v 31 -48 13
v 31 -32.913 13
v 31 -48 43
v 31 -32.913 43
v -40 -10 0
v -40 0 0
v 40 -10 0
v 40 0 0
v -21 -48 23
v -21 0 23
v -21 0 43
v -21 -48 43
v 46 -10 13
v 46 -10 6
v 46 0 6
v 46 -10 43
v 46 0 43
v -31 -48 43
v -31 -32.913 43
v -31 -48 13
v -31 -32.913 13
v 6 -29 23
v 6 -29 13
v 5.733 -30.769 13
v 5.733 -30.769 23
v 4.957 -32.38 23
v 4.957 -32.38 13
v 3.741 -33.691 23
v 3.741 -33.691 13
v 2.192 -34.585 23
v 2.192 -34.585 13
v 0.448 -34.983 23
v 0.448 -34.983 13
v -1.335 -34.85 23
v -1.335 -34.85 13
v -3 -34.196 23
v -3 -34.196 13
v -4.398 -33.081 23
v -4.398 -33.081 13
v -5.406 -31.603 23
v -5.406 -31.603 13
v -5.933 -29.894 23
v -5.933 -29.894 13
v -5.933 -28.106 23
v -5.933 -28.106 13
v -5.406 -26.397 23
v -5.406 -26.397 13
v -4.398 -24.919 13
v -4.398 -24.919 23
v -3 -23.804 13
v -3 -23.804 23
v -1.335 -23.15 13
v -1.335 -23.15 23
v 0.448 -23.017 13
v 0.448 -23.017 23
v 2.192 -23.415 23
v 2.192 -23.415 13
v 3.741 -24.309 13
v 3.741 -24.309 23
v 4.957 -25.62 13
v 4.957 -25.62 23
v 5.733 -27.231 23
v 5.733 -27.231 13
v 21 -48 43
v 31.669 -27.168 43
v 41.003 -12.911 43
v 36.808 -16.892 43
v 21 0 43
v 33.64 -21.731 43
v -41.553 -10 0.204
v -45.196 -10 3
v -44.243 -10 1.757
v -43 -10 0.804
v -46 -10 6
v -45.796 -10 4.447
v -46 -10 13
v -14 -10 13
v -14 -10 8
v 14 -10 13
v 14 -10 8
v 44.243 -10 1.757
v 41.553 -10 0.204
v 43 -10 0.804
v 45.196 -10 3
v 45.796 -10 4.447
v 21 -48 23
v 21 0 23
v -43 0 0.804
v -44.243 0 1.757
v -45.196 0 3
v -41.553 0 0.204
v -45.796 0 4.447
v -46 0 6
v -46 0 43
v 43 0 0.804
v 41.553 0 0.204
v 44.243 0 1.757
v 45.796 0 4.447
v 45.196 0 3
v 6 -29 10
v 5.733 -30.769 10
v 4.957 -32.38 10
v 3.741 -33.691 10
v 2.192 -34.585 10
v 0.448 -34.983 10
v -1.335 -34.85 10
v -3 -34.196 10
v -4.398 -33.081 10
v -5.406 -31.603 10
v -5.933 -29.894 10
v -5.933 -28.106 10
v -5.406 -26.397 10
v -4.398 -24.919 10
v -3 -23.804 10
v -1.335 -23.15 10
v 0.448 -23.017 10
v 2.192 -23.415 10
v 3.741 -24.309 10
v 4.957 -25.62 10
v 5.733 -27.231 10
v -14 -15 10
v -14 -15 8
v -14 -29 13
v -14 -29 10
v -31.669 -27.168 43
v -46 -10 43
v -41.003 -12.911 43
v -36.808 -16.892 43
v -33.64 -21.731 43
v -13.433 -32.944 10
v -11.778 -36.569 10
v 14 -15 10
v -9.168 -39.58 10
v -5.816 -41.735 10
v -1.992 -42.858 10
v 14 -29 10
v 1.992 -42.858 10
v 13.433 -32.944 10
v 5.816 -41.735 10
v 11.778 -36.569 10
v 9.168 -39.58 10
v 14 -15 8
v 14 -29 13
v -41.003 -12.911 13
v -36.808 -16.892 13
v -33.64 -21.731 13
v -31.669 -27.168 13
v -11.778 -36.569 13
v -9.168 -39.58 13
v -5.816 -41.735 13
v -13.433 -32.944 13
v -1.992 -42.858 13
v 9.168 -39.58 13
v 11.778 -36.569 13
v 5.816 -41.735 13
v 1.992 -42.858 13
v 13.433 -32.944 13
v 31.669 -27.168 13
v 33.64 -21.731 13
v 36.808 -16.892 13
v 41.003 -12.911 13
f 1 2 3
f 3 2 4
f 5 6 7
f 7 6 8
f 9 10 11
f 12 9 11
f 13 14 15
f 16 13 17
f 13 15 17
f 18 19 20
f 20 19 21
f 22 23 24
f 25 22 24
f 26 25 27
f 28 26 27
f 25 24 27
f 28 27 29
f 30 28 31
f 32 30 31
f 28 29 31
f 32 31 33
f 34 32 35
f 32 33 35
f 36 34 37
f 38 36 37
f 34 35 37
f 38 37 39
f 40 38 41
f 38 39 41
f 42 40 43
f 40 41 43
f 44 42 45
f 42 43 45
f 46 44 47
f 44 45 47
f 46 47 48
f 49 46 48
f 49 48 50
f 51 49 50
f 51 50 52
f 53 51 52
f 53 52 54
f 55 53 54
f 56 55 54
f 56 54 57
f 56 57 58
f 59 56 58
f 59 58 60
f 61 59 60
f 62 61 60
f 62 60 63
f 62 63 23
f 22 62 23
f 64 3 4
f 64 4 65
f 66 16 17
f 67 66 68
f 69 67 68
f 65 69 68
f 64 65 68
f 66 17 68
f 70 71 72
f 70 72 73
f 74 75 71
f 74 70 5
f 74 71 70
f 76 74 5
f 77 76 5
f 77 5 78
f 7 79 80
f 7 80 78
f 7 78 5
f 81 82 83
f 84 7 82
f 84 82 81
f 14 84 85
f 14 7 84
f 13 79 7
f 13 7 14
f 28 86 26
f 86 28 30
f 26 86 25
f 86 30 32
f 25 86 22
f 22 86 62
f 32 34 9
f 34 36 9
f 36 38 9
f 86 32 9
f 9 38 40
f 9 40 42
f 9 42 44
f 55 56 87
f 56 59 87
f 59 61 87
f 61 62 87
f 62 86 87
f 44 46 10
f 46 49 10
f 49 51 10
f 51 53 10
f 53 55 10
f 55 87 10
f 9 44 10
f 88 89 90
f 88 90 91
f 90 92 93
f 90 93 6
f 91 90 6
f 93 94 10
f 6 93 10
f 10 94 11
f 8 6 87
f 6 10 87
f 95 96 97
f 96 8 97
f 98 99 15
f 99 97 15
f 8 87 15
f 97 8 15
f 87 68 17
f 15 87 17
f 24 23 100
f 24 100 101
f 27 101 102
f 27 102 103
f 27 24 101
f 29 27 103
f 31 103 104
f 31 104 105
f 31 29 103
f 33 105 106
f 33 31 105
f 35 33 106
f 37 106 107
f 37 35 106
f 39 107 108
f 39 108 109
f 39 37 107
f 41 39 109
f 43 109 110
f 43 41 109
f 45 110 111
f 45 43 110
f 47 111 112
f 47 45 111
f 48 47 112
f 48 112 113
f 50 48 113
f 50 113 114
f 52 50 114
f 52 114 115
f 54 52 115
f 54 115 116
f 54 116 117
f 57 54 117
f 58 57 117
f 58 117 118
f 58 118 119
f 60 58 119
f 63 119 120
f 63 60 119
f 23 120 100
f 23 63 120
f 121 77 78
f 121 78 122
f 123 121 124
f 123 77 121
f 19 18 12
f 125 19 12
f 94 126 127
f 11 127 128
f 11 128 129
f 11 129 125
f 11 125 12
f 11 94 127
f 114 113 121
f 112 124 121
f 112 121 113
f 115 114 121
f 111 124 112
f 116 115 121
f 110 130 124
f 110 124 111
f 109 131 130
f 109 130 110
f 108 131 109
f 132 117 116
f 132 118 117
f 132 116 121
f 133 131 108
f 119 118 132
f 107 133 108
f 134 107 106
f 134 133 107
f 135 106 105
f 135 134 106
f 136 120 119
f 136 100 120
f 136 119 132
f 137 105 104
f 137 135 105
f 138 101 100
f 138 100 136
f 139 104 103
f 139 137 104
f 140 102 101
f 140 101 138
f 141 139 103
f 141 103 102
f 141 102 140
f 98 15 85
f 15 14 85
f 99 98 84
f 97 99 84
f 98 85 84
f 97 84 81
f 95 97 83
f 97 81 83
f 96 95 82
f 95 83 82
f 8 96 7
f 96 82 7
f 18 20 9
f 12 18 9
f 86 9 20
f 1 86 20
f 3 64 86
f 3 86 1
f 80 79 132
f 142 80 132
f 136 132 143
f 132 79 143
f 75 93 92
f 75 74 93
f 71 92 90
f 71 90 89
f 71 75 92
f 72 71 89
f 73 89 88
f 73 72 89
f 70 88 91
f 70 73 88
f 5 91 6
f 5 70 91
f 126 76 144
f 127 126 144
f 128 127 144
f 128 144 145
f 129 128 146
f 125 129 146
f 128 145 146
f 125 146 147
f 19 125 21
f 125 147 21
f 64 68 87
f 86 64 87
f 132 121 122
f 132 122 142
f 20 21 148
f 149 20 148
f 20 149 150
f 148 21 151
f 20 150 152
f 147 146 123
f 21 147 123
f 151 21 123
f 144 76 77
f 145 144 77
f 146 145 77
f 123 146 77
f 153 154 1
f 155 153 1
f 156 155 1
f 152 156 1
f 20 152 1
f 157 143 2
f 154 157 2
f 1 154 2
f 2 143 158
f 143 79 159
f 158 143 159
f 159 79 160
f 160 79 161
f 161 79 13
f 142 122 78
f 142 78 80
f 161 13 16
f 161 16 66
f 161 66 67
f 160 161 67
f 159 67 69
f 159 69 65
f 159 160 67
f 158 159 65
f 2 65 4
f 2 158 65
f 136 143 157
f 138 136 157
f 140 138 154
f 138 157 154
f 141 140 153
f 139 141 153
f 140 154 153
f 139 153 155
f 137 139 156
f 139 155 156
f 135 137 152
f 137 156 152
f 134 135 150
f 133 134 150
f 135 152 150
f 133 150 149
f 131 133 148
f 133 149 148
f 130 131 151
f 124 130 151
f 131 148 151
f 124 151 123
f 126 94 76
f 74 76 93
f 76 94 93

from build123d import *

# Parameters (mm, degrees)
F1_DEPTH    = 48
F2_DEPTH    = 10
F3_R        = 6
F4_T1_DEPTH = 30
F5_R        = 6
F6_DEPTH    = 3
F5_W        = 28
F5_H        = 5
F7_DEPTH    = 5
F8_DEPTH    = 25


# Not quite as in the source:
# - a fillet or chamfer that OpenCascade refuses, or shapes differently, is made with other operations: its cross-section is extruded or revolved along the edge and cut away or added


with BuildPart() as f1:
    # F0 (on Front) → F1 (new body)
    with BuildSketch(Plane.XZ):
        Polygon((-21, 43), (-31, 43), (-31, 13), (31, 13), (31, 43), (21, 43), (21, 23), (-21, 23), align=None)
    extrude(amount=F1_DEPTH)

    # F0 (on Front) → F2 (join)
    with BuildSketch(Plane.XZ):
        Polygon((-31, 43), (-46, 43), (-46, 0), (46, 0), (46, 43), (31, 43), (31, 13), (-31, 13), align=None)
        Polygon((-21, 43), (-31, 43), (-31, 13), (31, 13), (31, 43), (21, 43), (21, 23), (-21, 23), align=None)
    extrude(amount=F2_DEPTH)

    # F3
    f3_edges = [f1.edges().sort_by_distance(p)[0] for p in [
        (-46, -5, 0),
        (46, -5, 0),
    ]]
    fillet(f3_edges, radius=F3_R)

    # F4: fillet of radius 25 on 2 edges, made by hand

    # F4_s2 → F4_t1 (join)
    with BuildSketch(Plane.XY.offset(13)):
        with BuildLine():
            ThreePointArc((-46, -10), (-35.0834993366, -19.2198145372), (-31, -32.9128784748))
            Line((-31, -32.9128784748), (-31, -10))
            Line((-31, -10), (-46, -10))
        make_face()
        with BuildLine():
            ThreePointArc((46, -10), (35.0834993366, -19.2198145372), (31, -32.9128784748))
            Line((31, -32.9128784748), (31, -10))
            Line((31, -10), (46, -10))
        make_face()
    extrude(amount=F4_T1_DEPTH)

    # F5 (on face) → F6 (join)
    with BuildSketch(Plane(origin=(0, 0, 13), x_dir=(1, 0, 0), z_dir=(0, 0, -1))):
        with BuildLine():
            Line((14, 15), (14, 29))
            ThreePointArc((14, 29), (0, 43), (-14, 29))
            Line((-14, 29), (-14, 15))
            Line((-14, 15), (14, 15))
        make_face()
        with Locations((0, 29)):
            Circle(F5_R, mode=Mode.SUBTRACT)
    extrude(amount=F6_DEPTH)

    # F5 (on face) → F7 (join)
    with BuildSketch(Plane(origin=(0, 0, 13), x_dir=(1, 0, 0), z_dir=(0, 0, -1))):
        with Locations((0, 12.5)):
            Rectangle(F5_W, F5_H)
    extrude(amount=F7_DEPTH)

    # F5 (on face) → F8 (cut)
    with BuildSketch(Plane(origin=(0, 0, 13), x_dir=(1, 0, 0), z_dir=(0, 0, -1))):
        with Locations((0, 29)):
            Circle(F5_R)
    extrude(amount=-F8_DEPTH, mode=Mode.SUBTRACT)


solid = f1.part
